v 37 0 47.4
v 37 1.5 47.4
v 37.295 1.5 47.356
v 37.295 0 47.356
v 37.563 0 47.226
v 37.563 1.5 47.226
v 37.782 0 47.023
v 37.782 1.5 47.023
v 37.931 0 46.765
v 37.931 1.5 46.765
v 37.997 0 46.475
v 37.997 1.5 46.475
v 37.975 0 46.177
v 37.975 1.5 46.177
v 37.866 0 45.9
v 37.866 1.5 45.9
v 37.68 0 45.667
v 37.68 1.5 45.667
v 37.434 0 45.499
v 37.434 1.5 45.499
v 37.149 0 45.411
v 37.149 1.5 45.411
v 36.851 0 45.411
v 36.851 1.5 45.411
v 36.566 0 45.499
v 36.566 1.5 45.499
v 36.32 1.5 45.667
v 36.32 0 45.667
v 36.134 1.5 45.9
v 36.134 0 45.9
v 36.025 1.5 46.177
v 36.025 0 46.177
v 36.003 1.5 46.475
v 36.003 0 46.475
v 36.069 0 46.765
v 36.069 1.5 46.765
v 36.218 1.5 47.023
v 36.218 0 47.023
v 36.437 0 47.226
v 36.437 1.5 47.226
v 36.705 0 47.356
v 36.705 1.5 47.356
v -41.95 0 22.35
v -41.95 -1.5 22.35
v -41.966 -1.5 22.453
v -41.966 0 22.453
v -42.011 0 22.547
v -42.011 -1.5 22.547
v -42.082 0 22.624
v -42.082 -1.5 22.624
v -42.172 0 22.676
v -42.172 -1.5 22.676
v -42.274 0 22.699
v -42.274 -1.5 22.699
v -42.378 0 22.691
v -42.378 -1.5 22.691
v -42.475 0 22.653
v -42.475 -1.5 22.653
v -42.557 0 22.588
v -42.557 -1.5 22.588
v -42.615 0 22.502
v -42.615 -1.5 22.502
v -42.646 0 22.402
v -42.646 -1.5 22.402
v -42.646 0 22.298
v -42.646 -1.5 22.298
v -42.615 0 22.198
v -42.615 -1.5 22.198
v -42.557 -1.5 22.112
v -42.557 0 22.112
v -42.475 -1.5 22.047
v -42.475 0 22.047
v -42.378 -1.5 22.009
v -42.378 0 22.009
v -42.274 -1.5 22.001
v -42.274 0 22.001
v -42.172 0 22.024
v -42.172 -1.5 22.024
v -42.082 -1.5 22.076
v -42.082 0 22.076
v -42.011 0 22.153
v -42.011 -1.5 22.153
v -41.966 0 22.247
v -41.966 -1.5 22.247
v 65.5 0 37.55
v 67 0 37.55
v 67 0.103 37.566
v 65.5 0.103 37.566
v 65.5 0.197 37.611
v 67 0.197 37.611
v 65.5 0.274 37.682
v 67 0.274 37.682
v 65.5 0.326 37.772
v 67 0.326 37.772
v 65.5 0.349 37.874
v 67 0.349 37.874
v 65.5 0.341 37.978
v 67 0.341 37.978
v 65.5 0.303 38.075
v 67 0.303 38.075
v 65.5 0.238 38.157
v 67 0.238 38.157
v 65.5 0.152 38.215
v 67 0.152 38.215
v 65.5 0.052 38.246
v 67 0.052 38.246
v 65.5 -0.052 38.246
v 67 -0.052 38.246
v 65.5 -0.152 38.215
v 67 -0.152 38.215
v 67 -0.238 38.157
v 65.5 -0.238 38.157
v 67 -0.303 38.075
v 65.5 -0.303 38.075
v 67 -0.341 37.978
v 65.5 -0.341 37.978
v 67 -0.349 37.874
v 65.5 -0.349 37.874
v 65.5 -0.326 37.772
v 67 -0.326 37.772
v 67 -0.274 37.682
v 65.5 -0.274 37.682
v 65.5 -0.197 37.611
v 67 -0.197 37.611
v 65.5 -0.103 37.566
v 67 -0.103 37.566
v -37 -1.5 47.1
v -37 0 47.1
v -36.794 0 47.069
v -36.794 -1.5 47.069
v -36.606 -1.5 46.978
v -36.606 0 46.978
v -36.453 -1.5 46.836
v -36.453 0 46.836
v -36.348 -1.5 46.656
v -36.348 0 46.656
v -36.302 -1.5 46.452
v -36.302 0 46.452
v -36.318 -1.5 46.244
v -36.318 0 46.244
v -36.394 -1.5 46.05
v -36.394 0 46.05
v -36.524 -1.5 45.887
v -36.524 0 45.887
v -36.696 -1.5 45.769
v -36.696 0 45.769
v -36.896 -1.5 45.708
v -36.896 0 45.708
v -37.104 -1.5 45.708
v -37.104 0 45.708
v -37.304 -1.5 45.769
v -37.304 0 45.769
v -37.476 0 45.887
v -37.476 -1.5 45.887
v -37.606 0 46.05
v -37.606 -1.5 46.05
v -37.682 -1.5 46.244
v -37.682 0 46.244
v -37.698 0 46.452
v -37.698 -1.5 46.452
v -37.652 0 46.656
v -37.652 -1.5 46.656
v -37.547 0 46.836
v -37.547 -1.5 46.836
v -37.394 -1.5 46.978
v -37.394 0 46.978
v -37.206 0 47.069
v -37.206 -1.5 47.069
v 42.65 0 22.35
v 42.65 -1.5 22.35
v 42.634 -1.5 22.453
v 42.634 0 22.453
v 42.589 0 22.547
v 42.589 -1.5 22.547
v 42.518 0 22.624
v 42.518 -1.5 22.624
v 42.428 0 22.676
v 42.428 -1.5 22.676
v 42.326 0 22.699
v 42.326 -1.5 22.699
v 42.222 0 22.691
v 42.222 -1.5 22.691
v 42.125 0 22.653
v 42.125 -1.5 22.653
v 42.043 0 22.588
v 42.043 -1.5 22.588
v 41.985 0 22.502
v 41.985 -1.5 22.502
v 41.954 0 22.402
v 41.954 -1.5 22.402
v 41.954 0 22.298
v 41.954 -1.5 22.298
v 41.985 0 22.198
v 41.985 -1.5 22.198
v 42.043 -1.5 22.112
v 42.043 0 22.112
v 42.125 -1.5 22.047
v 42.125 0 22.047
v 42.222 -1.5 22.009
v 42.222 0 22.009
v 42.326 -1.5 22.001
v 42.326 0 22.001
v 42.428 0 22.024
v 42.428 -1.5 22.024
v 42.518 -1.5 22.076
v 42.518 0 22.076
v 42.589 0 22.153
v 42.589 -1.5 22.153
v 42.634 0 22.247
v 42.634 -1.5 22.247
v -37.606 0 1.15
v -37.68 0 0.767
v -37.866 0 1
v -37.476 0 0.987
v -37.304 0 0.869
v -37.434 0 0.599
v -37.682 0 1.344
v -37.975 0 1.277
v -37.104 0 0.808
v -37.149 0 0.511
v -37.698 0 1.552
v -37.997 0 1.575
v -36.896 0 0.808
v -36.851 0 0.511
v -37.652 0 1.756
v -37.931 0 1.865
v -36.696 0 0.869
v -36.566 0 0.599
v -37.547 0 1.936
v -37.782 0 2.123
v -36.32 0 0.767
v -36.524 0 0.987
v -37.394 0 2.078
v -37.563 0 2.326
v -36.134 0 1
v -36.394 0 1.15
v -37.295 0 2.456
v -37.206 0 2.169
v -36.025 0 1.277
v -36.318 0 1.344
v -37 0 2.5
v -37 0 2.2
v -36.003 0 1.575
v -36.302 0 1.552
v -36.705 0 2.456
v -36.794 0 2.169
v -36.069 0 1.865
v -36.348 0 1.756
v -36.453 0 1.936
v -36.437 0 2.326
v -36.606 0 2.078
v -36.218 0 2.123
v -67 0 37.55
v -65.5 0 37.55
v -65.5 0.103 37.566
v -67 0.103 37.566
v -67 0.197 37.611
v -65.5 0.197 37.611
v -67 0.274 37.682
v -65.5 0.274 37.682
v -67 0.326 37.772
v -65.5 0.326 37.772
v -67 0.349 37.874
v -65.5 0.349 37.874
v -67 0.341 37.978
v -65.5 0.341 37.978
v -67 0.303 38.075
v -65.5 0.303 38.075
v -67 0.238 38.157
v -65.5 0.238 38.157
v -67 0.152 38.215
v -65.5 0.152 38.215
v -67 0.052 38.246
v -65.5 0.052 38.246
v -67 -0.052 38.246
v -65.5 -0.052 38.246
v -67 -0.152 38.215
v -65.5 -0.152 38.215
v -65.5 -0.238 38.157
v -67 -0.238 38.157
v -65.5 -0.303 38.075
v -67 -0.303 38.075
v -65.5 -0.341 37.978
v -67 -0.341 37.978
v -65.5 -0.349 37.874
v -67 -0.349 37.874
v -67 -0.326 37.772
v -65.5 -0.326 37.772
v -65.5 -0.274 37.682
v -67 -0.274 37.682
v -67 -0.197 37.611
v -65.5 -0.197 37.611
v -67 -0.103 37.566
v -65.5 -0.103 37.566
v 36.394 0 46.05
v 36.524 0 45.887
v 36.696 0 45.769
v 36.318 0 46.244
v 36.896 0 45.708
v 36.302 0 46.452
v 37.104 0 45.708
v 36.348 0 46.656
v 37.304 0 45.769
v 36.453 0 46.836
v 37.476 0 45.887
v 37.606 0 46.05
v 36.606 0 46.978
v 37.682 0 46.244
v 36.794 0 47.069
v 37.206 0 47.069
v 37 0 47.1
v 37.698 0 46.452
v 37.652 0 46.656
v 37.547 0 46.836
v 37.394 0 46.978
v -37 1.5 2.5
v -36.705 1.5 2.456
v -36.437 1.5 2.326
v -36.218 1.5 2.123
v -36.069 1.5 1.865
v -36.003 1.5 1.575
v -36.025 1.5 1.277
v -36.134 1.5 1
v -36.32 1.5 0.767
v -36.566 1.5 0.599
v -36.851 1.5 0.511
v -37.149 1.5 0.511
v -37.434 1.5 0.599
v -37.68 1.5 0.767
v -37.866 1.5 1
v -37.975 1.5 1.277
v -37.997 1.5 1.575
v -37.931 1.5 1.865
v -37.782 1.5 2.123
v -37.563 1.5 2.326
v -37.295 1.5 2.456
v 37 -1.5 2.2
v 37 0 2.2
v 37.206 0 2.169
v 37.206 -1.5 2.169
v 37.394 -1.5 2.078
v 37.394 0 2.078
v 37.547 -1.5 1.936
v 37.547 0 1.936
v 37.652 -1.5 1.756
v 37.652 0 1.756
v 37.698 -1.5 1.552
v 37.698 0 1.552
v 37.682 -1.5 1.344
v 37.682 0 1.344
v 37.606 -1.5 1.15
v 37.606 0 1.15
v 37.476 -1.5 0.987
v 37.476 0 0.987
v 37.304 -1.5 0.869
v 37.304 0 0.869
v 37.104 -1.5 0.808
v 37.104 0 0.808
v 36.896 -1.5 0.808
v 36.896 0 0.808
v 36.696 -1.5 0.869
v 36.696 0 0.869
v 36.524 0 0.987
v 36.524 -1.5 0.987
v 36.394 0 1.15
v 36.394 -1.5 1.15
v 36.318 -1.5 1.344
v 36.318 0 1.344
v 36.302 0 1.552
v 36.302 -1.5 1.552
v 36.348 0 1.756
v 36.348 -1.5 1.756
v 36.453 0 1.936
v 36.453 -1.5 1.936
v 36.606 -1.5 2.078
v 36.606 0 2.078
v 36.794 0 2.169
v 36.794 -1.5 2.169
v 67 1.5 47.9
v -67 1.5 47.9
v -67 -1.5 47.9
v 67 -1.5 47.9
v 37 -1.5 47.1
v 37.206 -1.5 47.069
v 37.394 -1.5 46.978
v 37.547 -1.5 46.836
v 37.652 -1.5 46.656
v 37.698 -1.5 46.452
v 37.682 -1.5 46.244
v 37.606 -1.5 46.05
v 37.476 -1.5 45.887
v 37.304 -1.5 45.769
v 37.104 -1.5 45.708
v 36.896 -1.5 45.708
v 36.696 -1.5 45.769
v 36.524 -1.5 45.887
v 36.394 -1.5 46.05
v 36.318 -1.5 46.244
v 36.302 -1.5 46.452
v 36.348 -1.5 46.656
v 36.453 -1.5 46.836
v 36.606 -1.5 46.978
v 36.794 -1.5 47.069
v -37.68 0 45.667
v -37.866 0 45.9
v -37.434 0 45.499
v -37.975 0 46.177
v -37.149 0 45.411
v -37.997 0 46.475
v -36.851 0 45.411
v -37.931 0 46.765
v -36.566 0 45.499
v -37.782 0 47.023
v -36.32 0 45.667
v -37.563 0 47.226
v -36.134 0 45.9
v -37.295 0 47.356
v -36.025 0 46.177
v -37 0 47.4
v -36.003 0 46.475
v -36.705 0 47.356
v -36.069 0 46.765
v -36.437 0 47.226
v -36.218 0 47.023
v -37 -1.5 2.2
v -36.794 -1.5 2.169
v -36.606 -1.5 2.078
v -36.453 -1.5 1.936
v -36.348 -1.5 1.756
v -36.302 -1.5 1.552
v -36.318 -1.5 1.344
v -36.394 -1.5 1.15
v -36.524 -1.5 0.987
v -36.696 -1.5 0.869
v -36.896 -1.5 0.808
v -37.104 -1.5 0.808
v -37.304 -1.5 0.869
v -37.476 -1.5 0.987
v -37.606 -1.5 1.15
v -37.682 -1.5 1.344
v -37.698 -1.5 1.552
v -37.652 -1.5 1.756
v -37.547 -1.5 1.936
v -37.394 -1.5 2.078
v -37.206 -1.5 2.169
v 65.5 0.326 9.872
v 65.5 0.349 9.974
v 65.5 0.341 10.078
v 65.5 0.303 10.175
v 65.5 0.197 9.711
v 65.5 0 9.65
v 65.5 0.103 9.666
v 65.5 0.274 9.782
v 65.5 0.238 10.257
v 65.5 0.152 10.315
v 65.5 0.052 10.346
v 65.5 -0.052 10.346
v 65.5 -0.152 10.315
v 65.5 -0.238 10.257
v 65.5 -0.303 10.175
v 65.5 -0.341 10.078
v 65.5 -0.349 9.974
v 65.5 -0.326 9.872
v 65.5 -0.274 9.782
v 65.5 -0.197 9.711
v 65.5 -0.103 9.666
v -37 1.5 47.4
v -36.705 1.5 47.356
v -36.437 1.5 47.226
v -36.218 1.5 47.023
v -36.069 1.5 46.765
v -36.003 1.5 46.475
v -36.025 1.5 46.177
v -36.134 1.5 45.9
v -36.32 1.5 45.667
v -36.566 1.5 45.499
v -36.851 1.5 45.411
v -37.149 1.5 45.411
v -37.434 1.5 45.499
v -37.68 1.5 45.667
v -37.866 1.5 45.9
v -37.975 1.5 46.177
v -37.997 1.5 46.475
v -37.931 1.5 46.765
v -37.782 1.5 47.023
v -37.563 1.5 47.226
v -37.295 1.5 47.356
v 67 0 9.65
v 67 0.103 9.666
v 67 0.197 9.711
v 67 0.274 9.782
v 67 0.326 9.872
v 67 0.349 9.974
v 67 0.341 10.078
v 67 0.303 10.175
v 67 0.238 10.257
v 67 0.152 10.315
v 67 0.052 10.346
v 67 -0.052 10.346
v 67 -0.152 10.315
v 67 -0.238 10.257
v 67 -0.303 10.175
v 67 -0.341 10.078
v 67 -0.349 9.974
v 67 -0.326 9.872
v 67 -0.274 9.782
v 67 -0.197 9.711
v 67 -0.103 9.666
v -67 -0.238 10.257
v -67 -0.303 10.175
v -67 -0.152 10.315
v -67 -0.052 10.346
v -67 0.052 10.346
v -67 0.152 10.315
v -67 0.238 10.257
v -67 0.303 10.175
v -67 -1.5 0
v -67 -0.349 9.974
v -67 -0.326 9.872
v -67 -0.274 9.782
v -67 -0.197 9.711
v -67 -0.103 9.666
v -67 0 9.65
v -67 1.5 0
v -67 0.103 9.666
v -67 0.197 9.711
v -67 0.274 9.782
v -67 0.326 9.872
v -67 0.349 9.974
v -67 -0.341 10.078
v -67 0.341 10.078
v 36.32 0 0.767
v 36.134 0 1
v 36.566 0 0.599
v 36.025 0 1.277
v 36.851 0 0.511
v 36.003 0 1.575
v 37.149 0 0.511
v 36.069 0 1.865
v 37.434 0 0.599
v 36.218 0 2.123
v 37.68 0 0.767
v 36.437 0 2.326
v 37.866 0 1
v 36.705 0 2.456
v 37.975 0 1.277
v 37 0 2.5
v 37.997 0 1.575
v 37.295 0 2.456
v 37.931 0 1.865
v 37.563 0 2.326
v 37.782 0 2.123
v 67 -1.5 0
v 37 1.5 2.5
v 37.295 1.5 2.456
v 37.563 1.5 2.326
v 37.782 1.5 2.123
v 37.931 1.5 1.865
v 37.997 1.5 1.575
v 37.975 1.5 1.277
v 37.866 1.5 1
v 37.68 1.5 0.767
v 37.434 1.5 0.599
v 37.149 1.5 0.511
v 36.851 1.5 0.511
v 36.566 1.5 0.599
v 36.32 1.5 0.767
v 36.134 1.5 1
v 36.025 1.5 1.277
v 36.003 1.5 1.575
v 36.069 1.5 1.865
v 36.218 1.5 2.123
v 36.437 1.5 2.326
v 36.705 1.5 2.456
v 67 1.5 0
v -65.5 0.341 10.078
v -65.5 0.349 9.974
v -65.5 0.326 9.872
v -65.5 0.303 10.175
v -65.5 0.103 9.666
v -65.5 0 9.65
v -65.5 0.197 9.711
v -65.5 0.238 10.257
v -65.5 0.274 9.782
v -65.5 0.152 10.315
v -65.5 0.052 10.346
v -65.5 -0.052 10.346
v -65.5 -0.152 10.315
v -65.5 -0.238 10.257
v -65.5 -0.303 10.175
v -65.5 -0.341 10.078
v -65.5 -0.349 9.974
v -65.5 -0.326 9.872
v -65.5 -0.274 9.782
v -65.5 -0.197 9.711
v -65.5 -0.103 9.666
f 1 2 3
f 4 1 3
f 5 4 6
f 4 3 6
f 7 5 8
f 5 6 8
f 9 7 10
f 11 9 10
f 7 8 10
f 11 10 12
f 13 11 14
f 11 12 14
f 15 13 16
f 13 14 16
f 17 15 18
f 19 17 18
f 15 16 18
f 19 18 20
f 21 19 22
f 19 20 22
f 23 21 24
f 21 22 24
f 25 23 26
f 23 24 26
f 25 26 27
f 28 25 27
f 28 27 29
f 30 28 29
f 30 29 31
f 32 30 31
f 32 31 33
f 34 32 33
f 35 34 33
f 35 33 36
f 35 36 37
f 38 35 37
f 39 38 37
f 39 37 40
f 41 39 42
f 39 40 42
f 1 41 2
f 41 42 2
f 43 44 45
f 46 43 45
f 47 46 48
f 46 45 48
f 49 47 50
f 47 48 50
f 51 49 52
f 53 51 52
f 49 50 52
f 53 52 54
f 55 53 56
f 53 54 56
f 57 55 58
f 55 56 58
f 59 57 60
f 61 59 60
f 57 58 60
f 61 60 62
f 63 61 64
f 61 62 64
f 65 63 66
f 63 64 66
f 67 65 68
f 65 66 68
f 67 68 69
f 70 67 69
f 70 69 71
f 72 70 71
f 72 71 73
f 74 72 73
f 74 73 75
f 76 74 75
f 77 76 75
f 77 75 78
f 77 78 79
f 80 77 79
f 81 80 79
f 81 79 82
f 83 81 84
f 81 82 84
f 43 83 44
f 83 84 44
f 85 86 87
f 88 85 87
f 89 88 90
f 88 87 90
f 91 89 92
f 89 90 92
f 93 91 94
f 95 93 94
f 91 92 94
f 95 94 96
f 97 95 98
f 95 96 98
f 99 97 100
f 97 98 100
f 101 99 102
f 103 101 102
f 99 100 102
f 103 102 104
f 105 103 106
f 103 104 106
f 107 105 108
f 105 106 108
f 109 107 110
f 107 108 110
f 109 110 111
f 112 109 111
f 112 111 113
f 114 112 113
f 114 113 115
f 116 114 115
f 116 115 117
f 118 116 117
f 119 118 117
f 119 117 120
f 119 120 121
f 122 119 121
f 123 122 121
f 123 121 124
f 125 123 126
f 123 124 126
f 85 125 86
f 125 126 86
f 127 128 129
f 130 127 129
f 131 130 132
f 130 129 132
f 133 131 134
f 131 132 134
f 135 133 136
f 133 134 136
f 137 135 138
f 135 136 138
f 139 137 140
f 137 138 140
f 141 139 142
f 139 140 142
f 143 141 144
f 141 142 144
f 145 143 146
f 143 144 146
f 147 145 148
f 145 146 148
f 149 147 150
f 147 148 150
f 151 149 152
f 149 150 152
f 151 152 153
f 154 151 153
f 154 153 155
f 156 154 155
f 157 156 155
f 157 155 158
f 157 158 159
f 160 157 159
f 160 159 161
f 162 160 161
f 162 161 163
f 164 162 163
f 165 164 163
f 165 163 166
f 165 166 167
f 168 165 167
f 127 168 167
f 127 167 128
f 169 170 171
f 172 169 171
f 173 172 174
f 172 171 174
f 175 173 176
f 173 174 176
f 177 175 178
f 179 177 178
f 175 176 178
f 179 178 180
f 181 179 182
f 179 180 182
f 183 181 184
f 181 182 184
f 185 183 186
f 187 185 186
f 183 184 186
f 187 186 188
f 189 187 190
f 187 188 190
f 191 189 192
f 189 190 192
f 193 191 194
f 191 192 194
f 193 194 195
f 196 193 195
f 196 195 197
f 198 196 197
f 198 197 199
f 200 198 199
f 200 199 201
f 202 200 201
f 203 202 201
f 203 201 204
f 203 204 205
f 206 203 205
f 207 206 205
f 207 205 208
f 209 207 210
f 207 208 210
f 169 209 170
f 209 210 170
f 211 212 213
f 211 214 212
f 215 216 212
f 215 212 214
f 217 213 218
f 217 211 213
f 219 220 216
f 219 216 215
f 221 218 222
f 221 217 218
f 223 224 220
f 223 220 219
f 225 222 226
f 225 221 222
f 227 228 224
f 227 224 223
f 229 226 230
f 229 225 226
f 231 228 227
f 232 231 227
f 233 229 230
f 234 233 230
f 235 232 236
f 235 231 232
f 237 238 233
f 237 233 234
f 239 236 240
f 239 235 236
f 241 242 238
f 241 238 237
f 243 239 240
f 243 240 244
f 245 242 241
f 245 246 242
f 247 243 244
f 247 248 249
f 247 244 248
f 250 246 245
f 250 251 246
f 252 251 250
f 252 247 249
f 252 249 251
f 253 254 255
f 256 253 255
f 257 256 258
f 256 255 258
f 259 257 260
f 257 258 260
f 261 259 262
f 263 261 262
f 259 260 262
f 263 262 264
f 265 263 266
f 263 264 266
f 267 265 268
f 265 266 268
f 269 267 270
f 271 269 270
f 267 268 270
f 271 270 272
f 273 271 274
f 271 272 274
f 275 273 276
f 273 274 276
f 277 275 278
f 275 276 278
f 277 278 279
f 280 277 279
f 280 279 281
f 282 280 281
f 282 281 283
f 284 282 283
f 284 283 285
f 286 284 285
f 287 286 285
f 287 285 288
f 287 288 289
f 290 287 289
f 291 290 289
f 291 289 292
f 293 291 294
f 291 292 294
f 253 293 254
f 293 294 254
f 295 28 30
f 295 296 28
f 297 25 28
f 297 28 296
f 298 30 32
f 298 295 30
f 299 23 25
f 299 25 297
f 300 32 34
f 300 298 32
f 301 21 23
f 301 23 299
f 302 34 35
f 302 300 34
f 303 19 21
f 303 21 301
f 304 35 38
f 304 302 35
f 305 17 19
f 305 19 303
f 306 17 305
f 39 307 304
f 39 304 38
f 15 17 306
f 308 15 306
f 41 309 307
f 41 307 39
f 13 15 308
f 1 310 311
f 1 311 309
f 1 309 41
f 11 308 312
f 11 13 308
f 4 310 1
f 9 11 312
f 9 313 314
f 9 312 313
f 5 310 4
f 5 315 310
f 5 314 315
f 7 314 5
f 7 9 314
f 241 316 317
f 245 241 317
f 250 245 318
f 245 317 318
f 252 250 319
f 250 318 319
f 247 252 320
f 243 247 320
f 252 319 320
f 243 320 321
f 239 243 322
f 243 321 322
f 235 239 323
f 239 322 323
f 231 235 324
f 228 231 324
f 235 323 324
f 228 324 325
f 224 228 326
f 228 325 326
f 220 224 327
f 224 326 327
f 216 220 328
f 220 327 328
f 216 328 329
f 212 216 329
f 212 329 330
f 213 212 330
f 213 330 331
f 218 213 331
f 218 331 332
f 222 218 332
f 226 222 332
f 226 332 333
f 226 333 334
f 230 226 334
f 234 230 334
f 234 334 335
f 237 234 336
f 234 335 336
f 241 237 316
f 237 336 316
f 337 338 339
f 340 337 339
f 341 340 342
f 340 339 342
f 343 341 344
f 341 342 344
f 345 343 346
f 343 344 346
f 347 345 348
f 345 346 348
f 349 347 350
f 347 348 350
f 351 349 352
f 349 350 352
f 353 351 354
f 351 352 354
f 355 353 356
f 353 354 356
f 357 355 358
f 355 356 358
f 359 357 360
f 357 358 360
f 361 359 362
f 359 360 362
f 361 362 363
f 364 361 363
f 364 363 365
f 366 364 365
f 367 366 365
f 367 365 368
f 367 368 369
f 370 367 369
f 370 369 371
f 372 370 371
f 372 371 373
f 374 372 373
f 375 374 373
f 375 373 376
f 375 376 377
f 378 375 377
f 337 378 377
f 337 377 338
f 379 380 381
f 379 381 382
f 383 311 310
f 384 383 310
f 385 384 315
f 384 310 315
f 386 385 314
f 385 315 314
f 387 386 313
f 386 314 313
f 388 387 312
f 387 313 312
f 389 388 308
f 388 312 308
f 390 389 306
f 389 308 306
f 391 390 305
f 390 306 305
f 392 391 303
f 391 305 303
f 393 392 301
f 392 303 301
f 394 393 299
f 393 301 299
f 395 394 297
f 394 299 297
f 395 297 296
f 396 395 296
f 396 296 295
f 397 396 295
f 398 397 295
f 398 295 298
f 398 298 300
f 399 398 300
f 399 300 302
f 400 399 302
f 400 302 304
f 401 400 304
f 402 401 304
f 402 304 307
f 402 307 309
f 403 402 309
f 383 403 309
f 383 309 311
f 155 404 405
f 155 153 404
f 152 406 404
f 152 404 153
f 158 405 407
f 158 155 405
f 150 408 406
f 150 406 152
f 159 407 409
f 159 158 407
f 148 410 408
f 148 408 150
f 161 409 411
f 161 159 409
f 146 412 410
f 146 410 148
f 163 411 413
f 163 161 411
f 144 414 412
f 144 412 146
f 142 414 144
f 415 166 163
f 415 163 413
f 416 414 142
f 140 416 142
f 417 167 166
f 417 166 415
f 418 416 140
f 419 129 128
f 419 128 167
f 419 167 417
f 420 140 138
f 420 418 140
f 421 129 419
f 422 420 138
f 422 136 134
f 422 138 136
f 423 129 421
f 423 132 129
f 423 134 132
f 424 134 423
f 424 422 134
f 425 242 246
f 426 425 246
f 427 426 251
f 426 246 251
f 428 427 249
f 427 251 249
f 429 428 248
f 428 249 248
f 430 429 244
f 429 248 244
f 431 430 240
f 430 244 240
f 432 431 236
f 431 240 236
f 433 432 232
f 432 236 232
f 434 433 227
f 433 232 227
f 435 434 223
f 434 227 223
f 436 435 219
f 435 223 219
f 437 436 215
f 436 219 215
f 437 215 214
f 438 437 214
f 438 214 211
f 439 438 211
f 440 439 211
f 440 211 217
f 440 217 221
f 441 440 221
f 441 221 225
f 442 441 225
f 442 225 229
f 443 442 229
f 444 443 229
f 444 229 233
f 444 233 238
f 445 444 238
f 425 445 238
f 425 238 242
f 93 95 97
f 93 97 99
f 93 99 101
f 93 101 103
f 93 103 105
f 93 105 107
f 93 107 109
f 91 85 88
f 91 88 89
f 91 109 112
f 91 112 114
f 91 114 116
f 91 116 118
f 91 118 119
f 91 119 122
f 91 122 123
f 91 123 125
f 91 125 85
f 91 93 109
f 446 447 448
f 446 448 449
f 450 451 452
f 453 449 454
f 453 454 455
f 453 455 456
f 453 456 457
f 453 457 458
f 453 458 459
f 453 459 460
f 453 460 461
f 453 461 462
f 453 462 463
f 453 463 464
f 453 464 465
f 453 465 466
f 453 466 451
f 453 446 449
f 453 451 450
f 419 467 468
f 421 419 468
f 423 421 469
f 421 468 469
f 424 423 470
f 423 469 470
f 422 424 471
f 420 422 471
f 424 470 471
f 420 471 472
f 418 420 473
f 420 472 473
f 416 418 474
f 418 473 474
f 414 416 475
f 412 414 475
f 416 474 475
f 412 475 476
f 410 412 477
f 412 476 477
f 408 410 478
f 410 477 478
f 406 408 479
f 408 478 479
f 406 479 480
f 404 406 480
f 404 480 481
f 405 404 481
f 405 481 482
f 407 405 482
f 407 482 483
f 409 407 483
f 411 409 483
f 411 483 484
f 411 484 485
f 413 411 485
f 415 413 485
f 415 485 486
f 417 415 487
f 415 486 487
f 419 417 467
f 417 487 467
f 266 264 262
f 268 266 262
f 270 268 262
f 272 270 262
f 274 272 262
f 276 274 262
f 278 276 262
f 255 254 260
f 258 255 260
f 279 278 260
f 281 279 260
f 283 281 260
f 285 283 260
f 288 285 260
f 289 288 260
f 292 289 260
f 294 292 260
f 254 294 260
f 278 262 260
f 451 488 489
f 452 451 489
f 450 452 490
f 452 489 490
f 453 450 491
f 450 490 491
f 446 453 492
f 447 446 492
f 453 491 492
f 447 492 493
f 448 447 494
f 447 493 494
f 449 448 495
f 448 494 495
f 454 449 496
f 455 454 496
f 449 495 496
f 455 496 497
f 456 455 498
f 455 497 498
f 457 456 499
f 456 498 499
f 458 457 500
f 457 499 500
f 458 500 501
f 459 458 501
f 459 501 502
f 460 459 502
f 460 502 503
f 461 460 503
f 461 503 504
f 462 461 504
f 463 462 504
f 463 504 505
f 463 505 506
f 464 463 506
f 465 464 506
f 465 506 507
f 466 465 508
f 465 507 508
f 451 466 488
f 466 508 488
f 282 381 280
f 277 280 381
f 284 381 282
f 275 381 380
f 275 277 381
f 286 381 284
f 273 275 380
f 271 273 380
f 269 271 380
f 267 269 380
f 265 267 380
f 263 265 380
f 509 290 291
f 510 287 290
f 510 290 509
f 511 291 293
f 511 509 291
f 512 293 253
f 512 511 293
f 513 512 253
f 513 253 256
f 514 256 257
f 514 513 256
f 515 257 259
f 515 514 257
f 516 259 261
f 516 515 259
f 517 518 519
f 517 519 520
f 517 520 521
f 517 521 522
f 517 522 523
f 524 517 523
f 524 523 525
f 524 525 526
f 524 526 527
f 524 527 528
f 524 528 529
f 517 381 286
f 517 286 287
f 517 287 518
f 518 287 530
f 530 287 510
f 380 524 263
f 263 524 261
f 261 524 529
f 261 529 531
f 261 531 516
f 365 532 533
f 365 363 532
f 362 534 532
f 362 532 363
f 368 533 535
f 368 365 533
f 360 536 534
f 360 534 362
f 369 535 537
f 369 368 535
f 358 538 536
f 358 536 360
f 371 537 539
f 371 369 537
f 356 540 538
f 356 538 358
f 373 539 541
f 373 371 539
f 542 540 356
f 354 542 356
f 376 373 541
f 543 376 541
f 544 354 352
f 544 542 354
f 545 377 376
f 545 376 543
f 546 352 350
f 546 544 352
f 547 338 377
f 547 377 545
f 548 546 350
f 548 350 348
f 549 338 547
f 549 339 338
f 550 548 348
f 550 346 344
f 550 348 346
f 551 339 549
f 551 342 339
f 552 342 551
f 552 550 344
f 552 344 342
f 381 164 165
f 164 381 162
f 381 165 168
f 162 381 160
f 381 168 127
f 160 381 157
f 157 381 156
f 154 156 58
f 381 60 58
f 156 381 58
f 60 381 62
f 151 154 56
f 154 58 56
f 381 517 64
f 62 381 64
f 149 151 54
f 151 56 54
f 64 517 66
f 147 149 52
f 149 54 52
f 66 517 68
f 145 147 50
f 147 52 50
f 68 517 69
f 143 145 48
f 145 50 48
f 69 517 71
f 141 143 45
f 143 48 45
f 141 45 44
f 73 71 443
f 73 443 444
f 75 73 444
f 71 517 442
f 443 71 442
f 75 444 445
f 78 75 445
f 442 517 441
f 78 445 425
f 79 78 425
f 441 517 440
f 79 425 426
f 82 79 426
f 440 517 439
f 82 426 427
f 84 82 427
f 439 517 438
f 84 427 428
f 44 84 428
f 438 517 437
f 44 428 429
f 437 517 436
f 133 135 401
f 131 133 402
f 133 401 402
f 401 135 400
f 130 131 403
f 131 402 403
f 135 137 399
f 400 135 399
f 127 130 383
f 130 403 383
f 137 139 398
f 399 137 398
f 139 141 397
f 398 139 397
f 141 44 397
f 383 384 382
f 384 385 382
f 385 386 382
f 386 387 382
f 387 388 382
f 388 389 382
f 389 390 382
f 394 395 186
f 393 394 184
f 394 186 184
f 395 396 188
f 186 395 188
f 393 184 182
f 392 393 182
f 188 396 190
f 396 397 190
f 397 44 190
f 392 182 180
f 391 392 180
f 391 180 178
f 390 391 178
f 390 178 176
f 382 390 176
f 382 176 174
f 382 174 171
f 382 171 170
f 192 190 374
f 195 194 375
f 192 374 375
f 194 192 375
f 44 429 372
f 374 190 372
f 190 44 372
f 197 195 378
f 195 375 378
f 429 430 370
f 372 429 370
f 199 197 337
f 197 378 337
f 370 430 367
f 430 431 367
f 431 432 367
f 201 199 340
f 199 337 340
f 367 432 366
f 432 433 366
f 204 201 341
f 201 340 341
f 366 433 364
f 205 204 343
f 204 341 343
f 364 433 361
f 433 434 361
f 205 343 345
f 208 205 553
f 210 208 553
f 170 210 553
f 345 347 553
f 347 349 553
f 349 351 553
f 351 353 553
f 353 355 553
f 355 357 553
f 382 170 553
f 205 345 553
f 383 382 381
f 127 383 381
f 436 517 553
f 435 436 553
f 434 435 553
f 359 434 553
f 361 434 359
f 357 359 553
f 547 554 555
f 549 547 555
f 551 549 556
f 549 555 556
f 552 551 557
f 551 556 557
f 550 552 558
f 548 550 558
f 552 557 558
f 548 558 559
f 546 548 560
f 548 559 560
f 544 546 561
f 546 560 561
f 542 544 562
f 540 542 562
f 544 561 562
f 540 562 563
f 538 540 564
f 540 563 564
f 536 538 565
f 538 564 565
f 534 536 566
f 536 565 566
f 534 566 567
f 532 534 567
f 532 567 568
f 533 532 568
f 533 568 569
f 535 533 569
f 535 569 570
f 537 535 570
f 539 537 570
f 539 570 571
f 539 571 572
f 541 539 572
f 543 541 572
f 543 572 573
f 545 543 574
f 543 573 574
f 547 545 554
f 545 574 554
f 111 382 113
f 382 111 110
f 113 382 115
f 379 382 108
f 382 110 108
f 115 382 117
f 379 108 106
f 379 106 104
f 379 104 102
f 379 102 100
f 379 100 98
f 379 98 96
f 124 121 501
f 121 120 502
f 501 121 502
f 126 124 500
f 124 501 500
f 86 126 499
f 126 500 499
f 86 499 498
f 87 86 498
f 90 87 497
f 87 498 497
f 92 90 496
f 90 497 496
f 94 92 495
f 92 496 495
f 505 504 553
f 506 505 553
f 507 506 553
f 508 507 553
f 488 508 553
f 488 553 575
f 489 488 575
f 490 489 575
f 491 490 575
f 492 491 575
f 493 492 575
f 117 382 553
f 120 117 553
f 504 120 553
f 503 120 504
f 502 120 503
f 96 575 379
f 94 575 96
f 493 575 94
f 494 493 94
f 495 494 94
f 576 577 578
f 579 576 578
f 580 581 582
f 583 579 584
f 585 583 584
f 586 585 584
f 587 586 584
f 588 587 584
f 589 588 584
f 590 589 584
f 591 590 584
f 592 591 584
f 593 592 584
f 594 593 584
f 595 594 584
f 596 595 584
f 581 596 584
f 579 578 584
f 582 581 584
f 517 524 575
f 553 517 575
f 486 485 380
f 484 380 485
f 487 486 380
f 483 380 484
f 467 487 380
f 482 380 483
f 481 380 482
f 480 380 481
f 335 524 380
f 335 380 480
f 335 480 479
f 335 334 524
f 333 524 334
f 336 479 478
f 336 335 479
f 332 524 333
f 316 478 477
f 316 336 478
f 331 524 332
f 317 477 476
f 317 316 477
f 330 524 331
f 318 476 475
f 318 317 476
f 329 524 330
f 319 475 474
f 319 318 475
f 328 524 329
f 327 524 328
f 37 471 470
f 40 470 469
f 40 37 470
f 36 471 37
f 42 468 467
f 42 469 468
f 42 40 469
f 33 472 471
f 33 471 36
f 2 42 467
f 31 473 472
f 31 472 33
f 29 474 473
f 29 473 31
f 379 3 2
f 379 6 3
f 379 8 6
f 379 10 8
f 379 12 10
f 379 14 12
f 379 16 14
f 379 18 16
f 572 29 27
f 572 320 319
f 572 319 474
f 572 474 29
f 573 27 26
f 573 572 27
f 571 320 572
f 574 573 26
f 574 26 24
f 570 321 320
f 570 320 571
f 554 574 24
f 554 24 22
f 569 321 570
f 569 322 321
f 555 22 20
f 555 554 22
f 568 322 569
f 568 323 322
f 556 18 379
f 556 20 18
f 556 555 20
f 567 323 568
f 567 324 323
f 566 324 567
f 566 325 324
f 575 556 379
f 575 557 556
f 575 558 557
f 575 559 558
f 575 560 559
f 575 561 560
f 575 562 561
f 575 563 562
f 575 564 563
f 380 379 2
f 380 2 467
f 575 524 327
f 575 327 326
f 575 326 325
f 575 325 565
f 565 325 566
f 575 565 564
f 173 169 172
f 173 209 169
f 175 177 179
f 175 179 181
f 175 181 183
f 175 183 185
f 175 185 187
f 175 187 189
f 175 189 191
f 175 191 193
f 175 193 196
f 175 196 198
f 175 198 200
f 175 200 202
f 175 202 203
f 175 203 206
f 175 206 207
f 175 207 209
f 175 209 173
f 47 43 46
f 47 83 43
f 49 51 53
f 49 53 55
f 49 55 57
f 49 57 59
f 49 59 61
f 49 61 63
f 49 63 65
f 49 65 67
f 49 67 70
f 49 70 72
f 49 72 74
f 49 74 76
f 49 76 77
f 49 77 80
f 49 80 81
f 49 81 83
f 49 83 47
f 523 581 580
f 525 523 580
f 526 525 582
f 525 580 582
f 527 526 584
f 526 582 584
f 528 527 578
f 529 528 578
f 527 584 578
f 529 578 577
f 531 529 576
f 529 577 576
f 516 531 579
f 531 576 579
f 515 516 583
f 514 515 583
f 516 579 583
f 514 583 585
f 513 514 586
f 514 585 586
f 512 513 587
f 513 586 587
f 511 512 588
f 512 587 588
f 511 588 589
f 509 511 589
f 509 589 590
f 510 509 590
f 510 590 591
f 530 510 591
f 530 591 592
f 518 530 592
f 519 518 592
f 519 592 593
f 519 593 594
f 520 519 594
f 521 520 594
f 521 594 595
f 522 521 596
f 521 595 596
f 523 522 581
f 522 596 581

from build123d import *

# Parameters (mm, degrees)
SKETCH_1_W          = 134
SKETCH_1_H          = 3
EXTRUDE_1_DEPTH     = 47.9
SKETCH_4_R          = 0.7
CUT_EXTRUDE_1_DEPTH = 83.416078528
SKETCH_4_3_R        = 1
CUT_EXTRUDE_2_DEPTH = 1.5
SKETCH_5_R          = 0.35
CUT_EXTRUDE_3_DEPTH = 1.5
SKETCH_6_R          = 0.35
CUT_EXTRUDE_4_DEPTH = 1.5
CUT_EXTRUDE_START   = -132.5
SKETCH_6_3_R        = 0.35
CUT_EXTRUDE_5_DEPTH = 1.5


with BuildPart() as part:
    # 草图1 → 凸台-拉伸1 (new body)
    with BuildSketch(Plane.XY):
        Rectangle(SKETCH_1_W, SKETCH_1_H)
    extrude(amount=EXTRUDE_1_DEPTH)

    # 草图4 → 切除-拉伸1 (cut, through all)
    with BuildSketch(Plane(origin=(0, 1.5, 0), x_dir=(1, 0, 0), z_dir=(0, 1, 0))):
        with Locations(Location((-37, -46.4, 0), (0, 0, 270))):
            Circle(SKETCH_4_R)
        with Locations(Location((37, -46.4, 0), (0, 0, 270))):
            Circle(SKETCH_4_R)
        with Locations(Location((-37, -1.5, 0), (0, 0, 270))):
            Circle(SKETCH_4_R)
        with Locations(Location((37, -1.5, 0), (0, 0, 270))):
            Circle(SKETCH_4_R)
    extrude(amount=-CUT_EXTRUDE_1_DEPTH, mode=Mode.SUBTRACT)

    # 草图4<3> → 切除-拉伸2 (cut)
    with BuildSketch(Plane(origin=(0, 1.5, 0), x_dir=(1, 0, 0), z_dir=(0, 1, 0))):
        with Locations(Location((-37, -46.4, 0), (0, 0, 270))):
            Circle(SKETCH_4_3_R)
        with Locations(Location((37, -46.4, 0), (0, 0, 270))):
            Circle(SKETCH_4_3_R)
        with Locations(Location((37, -1.5, 0), (0, 0, 270))):
            Circle(SKETCH_4_3_R)
        with Locations(Location((-37, -1.5, 0), (0, 0, 270))):
            Circle(SKETCH_4_3_R)
    extrude(amount=-CUT_EXTRUDE_2_DEPTH, mode=Mode.SUBTRACT)

    # 草图5 → 切除-拉伸3 (cut)
    with BuildSketch(Plane.XZ.offset(1.5)):
        with Locations((-42.3, 22.35)):
            Circle(SKETCH_5_R)
        with Locations((42.3, 22.35)):
            Circle(SKETCH_5_R)
    extrude(amount=-CUT_EXTRUDE_3_DEPTH, mode=Mode.SUBTRACT)

    # 草图6 → 切除-拉伸4 (cut)
    with BuildSketch(Plane(origin=(67, 0, 0), x_dir=(0, 0, -1), z_dir=(1, 0, 0))):
        with Locations((-37.9, 0)):
            Circle(SKETCH_6_R)
        with Locations((-10, 0)):
            Circle(SKETCH_6_R)
    extrude(amount=-CUT_EXTRUDE_4_DEPTH, mode=Mode.SUBTRACT)

    # 草图6<3> → 切除-拉伸5 (cut)
    with BuildSketch(Plane(origin=(67, 0, 0), x_dir=(0, 0, -1), z_dir=(1, 0, 0)).offset(CUT_EXTRUDE_START)):
        with Locations((-37.9, 0)):
            Circle(SKETCH_6_3_R)
        with Locations((-10, 0)):
            Circle(SKETCH_6_3_R)
    extrude(amount=-CUT_EXTRUDE_5_DEPTH, mode=Mode.SUBTRACT)


solid = part.part
